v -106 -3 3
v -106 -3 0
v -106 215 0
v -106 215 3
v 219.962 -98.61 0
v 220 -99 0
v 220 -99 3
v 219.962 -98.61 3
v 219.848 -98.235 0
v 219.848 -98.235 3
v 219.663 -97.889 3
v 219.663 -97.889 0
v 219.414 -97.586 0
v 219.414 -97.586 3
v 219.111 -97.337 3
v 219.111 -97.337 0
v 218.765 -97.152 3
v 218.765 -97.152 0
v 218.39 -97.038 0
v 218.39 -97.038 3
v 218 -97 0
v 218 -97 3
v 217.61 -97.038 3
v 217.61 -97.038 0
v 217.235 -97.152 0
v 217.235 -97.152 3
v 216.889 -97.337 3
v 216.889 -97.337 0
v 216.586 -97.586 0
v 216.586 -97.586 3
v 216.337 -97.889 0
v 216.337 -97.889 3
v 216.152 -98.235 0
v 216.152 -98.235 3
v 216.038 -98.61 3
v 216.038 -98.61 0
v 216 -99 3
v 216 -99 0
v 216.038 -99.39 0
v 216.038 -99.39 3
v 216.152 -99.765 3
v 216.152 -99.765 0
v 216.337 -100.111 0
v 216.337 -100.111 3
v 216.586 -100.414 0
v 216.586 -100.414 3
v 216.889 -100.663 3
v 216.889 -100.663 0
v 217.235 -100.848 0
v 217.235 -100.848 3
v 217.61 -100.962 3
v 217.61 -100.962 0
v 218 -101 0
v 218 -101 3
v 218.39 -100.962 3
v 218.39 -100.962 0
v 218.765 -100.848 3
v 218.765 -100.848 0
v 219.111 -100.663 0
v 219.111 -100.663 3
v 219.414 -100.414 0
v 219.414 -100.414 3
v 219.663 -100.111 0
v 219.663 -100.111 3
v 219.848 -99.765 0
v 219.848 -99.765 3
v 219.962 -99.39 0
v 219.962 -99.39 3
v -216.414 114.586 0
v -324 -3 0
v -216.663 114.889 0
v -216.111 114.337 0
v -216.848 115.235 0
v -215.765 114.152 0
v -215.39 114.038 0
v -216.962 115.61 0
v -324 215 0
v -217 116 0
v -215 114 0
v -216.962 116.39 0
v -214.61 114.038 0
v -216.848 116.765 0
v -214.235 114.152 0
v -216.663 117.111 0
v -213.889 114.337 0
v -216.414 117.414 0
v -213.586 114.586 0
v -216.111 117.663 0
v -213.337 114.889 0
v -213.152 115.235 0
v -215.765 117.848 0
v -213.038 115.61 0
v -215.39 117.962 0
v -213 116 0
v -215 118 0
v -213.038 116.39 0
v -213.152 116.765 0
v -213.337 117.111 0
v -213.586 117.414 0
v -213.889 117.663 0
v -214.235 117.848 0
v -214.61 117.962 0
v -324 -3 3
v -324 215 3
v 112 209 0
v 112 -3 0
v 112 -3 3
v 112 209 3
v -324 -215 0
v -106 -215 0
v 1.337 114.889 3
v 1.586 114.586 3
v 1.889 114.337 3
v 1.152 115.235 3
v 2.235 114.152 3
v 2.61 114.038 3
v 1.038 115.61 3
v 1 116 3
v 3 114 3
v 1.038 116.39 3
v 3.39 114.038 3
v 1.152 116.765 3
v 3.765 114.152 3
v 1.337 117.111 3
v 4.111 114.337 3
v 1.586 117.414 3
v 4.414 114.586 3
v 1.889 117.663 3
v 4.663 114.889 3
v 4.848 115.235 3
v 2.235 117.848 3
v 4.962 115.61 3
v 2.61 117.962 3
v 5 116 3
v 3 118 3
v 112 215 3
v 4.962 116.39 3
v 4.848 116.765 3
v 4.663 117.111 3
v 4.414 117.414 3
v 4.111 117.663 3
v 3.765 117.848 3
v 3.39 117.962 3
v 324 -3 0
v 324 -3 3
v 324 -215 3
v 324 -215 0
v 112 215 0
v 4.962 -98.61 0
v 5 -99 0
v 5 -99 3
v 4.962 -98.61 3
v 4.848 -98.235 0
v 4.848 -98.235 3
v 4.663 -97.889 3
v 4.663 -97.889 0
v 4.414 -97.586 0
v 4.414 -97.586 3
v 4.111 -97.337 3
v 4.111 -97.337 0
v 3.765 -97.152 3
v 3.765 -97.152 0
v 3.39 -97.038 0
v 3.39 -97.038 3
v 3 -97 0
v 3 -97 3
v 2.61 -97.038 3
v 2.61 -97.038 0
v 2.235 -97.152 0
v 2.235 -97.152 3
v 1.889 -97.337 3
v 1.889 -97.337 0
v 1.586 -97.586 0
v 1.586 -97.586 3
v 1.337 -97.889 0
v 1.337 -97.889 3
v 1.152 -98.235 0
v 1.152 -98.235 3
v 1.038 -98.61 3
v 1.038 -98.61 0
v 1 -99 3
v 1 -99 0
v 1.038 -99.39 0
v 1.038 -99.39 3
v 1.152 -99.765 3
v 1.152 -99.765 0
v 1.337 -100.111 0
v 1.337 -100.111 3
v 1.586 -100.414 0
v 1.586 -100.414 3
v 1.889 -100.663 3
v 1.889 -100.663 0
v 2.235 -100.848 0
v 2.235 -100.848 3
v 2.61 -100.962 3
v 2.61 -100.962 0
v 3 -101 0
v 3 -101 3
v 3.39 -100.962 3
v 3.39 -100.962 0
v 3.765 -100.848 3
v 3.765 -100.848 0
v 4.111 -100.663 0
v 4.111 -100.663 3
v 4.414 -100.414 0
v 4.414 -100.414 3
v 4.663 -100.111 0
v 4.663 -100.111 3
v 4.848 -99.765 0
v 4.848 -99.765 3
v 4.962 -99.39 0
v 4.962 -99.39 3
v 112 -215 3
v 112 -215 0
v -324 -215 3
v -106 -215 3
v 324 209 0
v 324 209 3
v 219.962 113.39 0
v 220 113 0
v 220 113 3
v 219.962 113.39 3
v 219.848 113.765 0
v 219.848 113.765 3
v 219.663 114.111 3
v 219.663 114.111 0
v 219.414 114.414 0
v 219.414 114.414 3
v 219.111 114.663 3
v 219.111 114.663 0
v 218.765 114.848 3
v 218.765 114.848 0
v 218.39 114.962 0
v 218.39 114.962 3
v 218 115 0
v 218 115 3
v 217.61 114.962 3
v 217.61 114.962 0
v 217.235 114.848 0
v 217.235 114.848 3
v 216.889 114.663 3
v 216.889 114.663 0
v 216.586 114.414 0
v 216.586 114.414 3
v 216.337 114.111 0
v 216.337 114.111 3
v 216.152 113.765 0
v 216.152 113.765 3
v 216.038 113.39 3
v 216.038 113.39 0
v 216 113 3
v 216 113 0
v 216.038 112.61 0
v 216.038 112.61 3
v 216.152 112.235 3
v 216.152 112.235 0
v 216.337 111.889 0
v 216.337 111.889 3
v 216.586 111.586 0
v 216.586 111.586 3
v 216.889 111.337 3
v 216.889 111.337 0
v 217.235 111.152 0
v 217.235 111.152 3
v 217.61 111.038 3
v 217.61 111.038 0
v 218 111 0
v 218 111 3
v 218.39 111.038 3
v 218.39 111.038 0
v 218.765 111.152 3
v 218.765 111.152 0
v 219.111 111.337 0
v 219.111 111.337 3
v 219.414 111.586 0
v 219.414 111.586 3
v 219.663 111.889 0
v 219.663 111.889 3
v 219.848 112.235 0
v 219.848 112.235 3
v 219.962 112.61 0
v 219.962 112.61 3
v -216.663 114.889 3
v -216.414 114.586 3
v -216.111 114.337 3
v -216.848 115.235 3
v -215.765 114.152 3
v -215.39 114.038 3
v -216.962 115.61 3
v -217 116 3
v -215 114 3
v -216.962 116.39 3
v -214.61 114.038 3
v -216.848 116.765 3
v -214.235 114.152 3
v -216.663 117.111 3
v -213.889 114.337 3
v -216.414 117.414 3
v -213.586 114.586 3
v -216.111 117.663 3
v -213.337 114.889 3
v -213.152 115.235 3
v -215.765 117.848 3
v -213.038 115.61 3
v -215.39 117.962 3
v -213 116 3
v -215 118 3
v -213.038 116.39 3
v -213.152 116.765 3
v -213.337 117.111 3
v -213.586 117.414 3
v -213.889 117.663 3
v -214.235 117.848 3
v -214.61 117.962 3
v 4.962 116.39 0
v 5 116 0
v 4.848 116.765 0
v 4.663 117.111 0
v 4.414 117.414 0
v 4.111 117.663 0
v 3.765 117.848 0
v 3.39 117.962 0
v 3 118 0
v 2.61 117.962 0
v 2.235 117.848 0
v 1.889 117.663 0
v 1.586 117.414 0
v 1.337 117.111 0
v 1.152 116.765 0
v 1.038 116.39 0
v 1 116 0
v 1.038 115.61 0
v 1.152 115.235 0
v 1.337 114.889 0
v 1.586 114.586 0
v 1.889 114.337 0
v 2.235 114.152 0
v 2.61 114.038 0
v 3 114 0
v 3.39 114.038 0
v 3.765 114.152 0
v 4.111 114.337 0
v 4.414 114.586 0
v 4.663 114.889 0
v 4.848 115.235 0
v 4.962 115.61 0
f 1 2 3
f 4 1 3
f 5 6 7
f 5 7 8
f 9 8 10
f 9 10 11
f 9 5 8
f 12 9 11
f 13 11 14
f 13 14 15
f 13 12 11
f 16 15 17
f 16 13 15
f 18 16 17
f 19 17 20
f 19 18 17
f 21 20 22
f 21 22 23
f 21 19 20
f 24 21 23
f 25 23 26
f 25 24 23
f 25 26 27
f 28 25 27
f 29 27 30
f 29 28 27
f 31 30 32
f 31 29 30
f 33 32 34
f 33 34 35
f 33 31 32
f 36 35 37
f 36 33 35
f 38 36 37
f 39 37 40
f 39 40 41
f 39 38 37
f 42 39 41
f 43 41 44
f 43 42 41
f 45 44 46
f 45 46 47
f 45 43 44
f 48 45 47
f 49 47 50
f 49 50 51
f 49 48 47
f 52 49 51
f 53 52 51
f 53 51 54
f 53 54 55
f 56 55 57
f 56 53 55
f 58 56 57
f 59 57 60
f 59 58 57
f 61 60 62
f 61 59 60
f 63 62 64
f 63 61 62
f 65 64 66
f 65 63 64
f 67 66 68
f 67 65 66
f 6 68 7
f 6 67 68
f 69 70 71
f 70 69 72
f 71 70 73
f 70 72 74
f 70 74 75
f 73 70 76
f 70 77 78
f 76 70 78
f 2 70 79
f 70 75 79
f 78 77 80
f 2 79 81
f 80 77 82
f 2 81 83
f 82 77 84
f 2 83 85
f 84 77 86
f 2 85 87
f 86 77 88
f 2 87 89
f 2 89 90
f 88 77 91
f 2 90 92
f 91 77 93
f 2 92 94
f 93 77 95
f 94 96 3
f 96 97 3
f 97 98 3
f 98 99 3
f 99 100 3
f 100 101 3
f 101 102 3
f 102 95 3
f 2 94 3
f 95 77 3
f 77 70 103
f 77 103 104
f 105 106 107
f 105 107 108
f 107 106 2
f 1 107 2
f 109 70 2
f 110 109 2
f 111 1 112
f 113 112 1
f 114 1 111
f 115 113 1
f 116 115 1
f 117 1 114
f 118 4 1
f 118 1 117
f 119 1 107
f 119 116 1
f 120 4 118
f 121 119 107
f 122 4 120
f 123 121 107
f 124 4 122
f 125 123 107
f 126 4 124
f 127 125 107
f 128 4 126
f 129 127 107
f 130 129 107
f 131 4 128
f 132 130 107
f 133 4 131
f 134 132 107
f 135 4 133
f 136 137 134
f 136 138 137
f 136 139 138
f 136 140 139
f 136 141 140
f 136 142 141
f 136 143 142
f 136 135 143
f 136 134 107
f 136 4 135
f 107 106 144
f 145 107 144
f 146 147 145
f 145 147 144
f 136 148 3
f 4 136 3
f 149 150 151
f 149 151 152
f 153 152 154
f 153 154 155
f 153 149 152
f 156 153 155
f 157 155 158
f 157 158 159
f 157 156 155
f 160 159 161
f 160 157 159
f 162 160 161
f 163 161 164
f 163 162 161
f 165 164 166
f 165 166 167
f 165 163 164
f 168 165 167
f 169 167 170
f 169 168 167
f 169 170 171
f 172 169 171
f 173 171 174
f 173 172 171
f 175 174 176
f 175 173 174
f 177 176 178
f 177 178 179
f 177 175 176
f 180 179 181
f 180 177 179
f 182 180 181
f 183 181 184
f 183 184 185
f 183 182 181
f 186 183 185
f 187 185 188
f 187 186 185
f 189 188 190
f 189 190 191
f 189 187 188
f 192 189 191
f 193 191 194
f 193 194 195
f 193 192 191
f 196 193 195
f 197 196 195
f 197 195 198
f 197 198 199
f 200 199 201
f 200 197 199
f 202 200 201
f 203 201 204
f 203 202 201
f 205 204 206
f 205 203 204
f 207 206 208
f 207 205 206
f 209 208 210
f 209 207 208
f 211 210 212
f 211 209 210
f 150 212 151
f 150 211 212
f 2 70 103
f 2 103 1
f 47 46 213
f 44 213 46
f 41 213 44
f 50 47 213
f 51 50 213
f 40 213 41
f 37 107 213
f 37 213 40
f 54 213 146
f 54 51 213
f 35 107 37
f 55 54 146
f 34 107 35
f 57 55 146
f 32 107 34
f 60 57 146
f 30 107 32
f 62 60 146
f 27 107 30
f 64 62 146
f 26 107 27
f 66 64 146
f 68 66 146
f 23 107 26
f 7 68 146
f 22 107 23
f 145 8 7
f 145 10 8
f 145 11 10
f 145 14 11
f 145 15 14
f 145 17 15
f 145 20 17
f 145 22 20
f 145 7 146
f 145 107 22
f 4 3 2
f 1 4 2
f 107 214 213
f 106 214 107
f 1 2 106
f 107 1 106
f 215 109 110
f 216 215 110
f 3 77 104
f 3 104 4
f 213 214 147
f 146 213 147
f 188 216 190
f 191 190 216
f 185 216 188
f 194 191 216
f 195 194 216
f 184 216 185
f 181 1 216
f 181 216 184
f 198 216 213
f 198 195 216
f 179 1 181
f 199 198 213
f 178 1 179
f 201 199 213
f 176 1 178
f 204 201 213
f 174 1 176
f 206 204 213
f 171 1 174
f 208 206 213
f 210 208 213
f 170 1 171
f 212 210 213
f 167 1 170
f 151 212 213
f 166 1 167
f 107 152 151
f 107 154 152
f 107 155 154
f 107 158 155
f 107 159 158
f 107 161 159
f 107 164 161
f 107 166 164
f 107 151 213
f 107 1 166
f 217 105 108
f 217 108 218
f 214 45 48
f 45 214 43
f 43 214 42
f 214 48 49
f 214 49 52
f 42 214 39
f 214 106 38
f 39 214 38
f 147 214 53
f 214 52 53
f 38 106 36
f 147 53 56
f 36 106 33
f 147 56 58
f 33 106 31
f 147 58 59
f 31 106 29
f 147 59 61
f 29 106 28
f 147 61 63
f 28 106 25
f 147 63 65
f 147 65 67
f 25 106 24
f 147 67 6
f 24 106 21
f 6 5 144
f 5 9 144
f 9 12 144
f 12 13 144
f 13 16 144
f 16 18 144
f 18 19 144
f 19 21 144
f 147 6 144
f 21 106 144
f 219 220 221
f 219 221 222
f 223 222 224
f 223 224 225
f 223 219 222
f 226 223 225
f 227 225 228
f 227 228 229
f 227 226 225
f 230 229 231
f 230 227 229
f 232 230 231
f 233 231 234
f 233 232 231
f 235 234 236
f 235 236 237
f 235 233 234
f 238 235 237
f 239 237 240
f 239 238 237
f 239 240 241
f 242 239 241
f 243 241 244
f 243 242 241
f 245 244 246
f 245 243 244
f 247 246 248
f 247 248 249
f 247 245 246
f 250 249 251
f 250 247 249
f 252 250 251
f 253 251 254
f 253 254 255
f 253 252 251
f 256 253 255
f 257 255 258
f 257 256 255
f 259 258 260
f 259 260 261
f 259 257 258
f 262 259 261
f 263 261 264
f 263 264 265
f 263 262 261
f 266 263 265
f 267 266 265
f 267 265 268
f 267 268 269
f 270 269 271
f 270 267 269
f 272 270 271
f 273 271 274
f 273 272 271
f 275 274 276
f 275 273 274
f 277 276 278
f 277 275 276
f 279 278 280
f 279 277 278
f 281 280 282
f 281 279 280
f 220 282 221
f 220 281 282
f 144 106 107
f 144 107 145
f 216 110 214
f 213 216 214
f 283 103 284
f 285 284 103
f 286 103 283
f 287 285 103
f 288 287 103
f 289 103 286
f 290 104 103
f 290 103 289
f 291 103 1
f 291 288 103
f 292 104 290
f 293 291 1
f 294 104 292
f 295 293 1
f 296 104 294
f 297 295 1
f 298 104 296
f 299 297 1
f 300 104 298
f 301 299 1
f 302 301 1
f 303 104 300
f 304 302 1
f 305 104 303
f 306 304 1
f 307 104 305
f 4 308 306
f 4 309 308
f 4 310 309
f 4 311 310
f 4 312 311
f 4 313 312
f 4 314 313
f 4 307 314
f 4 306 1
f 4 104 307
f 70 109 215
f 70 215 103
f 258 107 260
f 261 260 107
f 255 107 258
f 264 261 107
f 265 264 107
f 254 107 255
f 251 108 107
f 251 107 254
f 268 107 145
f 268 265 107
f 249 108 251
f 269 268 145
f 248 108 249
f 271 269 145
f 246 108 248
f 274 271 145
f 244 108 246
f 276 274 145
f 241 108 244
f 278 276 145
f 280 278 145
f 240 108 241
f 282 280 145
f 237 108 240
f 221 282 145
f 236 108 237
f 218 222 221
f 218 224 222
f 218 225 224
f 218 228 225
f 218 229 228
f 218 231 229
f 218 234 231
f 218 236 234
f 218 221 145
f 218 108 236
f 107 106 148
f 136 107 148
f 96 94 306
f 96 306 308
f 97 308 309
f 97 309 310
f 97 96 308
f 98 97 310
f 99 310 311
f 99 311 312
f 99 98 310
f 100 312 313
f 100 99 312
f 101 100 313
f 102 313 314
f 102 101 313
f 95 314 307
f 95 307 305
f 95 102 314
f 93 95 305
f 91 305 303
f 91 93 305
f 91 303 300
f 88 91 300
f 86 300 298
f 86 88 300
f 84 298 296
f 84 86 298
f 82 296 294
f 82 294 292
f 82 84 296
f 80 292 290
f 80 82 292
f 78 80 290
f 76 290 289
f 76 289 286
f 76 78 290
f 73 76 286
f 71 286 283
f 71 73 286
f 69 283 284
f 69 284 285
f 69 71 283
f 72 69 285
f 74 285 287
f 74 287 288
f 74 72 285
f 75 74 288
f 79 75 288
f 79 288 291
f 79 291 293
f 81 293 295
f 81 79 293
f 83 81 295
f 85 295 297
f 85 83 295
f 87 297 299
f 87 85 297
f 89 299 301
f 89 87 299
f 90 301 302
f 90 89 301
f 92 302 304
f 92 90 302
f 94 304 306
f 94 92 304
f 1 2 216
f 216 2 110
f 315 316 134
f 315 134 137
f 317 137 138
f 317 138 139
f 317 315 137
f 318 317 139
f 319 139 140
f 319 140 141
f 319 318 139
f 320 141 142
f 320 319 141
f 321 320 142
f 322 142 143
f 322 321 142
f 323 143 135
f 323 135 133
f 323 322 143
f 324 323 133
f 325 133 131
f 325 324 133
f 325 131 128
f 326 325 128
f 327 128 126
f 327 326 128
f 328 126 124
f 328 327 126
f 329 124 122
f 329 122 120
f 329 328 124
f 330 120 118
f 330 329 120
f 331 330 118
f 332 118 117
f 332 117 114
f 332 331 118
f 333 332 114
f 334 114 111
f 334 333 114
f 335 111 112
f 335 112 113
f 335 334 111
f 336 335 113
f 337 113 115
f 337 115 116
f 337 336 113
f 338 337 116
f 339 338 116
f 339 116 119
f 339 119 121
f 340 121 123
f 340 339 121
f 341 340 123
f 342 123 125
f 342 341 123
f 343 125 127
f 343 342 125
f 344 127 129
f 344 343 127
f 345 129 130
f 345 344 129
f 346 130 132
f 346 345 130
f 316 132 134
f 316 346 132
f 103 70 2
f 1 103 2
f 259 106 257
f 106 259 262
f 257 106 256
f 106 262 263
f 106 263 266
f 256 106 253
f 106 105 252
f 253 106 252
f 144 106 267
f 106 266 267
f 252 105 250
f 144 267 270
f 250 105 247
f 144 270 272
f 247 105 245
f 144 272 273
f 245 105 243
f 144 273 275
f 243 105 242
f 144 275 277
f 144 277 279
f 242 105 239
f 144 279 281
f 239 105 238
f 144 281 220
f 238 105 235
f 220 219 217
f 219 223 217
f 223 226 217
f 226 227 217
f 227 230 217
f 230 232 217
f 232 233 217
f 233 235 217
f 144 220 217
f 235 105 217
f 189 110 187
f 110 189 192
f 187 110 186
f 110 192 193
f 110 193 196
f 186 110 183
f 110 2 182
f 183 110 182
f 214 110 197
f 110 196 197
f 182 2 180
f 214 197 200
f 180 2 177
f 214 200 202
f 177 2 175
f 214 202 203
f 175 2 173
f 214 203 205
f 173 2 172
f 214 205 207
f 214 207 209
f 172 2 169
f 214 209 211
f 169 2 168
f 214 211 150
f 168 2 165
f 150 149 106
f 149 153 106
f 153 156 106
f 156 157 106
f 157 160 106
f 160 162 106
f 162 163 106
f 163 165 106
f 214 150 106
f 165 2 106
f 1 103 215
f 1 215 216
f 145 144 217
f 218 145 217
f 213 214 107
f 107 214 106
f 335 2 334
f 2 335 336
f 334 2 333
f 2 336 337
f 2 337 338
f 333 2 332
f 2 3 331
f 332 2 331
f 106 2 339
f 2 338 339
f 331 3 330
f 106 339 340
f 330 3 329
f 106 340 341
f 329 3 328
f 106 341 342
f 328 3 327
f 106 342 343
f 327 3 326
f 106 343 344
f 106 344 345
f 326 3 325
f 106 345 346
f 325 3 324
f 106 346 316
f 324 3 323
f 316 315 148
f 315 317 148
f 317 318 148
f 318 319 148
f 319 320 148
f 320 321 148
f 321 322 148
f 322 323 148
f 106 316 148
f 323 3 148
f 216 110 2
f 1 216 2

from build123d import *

# Parameters (mm, degrees)
F0_W     = 218.00013
F0_H     = 218.00013
F0_R     = 2
F1_DEPTH = 3
F2_DEPTH = 3
F0_W_2   = 212.000152
F0_H_2   = 212.000152
F3_DEPTH = 3
F0_H_3   = 211.99987
F4_DEPTH = 3
F5_DEPTH = 3
F0_H_4   = 211.999979
F6_DEPTH = 3


with BuildPart() as f1:
    # F0 (on Top) → F1 (new body)
    with BuildSketch(Plane.XY):
        with Locations((-215.000055, 105.999989)):
            Rectangle(F0_W, F0_H)
        with Locations((-215.000055, 115.999989)):
            Circle(F0_R, mode=Mode.SUBTRACT)
    extrude(amount=F1_DEPTH)


with BuildPart() as f2:
    # F0 (on Top) → F2 (new body)
    with BuildSketch(Plane.XY):
        Polygon((111.999968, 215.000054), (-105.99999, 215.000054), (-105.99999, -3.000076), (111.999968, -3.000076), (111.999968, 209.000076), align=None)
        with Locations((2.999989, 115.999989)):
            Circle(F0_R, mode=Mode.SUBTRACT)
    extrude(amount=F2_DEPTH)


with BuildPart() as f3:
    # F0 (on Top) → F3 (new body)
    with BuildSketch(Plane.XY):
        with Locations((218.000044, 103)):
            Rectangle(F0_W_2, F0_H_2)
        with Locations((218.000044, 113)):
            Circle(F0_R, mode=Mode.SUBTRACT)
    extrude(amount=F3_DEPTH)


with BuildPart() as f4:
    # F0 (on Top) → F4 (new body)
    with BuildSketch(Plane.XY):
        with Locations((-215.000055, -109.000011)):
            Rectangle(F0_W, F0_H_3)
    extrude(amount=F4_DEPTH)


with BuildPart() as f5:
    # F0 (on Top) → F5 (new body)
    with BuildSketch(Plane.XY):
        Polygon((111.999968, -3.000076), (-105.99999, -3.000076), (-105.99999, -214.999946), (-105.99999, -215.000055), (111.999968, -215.000055), align=None)
        with Locations((2.999989, -99.0000655)):
            Circle(F0_R, mode=Mode.SUBTRACT)
    extrude(amount=F5_DEPTH)


with BuildPart() as f6:
    # F0 (on Top) → F6 (new body)
    with BuildSketch(Plane.XY):
        with Locations((218.000044, -109.0000655)):
            Rectangle(F0_W_2, F0_H_4)
        with Locations((218.000044, -99.0000655)):
            Circle(F0_R, mode=Mode.SUBTRACT)
    extrude(amount=F6_DEPTH)


solid = Compound([f1.part, f2.part, f3.part, f4.part, f5.part, f6.part])
